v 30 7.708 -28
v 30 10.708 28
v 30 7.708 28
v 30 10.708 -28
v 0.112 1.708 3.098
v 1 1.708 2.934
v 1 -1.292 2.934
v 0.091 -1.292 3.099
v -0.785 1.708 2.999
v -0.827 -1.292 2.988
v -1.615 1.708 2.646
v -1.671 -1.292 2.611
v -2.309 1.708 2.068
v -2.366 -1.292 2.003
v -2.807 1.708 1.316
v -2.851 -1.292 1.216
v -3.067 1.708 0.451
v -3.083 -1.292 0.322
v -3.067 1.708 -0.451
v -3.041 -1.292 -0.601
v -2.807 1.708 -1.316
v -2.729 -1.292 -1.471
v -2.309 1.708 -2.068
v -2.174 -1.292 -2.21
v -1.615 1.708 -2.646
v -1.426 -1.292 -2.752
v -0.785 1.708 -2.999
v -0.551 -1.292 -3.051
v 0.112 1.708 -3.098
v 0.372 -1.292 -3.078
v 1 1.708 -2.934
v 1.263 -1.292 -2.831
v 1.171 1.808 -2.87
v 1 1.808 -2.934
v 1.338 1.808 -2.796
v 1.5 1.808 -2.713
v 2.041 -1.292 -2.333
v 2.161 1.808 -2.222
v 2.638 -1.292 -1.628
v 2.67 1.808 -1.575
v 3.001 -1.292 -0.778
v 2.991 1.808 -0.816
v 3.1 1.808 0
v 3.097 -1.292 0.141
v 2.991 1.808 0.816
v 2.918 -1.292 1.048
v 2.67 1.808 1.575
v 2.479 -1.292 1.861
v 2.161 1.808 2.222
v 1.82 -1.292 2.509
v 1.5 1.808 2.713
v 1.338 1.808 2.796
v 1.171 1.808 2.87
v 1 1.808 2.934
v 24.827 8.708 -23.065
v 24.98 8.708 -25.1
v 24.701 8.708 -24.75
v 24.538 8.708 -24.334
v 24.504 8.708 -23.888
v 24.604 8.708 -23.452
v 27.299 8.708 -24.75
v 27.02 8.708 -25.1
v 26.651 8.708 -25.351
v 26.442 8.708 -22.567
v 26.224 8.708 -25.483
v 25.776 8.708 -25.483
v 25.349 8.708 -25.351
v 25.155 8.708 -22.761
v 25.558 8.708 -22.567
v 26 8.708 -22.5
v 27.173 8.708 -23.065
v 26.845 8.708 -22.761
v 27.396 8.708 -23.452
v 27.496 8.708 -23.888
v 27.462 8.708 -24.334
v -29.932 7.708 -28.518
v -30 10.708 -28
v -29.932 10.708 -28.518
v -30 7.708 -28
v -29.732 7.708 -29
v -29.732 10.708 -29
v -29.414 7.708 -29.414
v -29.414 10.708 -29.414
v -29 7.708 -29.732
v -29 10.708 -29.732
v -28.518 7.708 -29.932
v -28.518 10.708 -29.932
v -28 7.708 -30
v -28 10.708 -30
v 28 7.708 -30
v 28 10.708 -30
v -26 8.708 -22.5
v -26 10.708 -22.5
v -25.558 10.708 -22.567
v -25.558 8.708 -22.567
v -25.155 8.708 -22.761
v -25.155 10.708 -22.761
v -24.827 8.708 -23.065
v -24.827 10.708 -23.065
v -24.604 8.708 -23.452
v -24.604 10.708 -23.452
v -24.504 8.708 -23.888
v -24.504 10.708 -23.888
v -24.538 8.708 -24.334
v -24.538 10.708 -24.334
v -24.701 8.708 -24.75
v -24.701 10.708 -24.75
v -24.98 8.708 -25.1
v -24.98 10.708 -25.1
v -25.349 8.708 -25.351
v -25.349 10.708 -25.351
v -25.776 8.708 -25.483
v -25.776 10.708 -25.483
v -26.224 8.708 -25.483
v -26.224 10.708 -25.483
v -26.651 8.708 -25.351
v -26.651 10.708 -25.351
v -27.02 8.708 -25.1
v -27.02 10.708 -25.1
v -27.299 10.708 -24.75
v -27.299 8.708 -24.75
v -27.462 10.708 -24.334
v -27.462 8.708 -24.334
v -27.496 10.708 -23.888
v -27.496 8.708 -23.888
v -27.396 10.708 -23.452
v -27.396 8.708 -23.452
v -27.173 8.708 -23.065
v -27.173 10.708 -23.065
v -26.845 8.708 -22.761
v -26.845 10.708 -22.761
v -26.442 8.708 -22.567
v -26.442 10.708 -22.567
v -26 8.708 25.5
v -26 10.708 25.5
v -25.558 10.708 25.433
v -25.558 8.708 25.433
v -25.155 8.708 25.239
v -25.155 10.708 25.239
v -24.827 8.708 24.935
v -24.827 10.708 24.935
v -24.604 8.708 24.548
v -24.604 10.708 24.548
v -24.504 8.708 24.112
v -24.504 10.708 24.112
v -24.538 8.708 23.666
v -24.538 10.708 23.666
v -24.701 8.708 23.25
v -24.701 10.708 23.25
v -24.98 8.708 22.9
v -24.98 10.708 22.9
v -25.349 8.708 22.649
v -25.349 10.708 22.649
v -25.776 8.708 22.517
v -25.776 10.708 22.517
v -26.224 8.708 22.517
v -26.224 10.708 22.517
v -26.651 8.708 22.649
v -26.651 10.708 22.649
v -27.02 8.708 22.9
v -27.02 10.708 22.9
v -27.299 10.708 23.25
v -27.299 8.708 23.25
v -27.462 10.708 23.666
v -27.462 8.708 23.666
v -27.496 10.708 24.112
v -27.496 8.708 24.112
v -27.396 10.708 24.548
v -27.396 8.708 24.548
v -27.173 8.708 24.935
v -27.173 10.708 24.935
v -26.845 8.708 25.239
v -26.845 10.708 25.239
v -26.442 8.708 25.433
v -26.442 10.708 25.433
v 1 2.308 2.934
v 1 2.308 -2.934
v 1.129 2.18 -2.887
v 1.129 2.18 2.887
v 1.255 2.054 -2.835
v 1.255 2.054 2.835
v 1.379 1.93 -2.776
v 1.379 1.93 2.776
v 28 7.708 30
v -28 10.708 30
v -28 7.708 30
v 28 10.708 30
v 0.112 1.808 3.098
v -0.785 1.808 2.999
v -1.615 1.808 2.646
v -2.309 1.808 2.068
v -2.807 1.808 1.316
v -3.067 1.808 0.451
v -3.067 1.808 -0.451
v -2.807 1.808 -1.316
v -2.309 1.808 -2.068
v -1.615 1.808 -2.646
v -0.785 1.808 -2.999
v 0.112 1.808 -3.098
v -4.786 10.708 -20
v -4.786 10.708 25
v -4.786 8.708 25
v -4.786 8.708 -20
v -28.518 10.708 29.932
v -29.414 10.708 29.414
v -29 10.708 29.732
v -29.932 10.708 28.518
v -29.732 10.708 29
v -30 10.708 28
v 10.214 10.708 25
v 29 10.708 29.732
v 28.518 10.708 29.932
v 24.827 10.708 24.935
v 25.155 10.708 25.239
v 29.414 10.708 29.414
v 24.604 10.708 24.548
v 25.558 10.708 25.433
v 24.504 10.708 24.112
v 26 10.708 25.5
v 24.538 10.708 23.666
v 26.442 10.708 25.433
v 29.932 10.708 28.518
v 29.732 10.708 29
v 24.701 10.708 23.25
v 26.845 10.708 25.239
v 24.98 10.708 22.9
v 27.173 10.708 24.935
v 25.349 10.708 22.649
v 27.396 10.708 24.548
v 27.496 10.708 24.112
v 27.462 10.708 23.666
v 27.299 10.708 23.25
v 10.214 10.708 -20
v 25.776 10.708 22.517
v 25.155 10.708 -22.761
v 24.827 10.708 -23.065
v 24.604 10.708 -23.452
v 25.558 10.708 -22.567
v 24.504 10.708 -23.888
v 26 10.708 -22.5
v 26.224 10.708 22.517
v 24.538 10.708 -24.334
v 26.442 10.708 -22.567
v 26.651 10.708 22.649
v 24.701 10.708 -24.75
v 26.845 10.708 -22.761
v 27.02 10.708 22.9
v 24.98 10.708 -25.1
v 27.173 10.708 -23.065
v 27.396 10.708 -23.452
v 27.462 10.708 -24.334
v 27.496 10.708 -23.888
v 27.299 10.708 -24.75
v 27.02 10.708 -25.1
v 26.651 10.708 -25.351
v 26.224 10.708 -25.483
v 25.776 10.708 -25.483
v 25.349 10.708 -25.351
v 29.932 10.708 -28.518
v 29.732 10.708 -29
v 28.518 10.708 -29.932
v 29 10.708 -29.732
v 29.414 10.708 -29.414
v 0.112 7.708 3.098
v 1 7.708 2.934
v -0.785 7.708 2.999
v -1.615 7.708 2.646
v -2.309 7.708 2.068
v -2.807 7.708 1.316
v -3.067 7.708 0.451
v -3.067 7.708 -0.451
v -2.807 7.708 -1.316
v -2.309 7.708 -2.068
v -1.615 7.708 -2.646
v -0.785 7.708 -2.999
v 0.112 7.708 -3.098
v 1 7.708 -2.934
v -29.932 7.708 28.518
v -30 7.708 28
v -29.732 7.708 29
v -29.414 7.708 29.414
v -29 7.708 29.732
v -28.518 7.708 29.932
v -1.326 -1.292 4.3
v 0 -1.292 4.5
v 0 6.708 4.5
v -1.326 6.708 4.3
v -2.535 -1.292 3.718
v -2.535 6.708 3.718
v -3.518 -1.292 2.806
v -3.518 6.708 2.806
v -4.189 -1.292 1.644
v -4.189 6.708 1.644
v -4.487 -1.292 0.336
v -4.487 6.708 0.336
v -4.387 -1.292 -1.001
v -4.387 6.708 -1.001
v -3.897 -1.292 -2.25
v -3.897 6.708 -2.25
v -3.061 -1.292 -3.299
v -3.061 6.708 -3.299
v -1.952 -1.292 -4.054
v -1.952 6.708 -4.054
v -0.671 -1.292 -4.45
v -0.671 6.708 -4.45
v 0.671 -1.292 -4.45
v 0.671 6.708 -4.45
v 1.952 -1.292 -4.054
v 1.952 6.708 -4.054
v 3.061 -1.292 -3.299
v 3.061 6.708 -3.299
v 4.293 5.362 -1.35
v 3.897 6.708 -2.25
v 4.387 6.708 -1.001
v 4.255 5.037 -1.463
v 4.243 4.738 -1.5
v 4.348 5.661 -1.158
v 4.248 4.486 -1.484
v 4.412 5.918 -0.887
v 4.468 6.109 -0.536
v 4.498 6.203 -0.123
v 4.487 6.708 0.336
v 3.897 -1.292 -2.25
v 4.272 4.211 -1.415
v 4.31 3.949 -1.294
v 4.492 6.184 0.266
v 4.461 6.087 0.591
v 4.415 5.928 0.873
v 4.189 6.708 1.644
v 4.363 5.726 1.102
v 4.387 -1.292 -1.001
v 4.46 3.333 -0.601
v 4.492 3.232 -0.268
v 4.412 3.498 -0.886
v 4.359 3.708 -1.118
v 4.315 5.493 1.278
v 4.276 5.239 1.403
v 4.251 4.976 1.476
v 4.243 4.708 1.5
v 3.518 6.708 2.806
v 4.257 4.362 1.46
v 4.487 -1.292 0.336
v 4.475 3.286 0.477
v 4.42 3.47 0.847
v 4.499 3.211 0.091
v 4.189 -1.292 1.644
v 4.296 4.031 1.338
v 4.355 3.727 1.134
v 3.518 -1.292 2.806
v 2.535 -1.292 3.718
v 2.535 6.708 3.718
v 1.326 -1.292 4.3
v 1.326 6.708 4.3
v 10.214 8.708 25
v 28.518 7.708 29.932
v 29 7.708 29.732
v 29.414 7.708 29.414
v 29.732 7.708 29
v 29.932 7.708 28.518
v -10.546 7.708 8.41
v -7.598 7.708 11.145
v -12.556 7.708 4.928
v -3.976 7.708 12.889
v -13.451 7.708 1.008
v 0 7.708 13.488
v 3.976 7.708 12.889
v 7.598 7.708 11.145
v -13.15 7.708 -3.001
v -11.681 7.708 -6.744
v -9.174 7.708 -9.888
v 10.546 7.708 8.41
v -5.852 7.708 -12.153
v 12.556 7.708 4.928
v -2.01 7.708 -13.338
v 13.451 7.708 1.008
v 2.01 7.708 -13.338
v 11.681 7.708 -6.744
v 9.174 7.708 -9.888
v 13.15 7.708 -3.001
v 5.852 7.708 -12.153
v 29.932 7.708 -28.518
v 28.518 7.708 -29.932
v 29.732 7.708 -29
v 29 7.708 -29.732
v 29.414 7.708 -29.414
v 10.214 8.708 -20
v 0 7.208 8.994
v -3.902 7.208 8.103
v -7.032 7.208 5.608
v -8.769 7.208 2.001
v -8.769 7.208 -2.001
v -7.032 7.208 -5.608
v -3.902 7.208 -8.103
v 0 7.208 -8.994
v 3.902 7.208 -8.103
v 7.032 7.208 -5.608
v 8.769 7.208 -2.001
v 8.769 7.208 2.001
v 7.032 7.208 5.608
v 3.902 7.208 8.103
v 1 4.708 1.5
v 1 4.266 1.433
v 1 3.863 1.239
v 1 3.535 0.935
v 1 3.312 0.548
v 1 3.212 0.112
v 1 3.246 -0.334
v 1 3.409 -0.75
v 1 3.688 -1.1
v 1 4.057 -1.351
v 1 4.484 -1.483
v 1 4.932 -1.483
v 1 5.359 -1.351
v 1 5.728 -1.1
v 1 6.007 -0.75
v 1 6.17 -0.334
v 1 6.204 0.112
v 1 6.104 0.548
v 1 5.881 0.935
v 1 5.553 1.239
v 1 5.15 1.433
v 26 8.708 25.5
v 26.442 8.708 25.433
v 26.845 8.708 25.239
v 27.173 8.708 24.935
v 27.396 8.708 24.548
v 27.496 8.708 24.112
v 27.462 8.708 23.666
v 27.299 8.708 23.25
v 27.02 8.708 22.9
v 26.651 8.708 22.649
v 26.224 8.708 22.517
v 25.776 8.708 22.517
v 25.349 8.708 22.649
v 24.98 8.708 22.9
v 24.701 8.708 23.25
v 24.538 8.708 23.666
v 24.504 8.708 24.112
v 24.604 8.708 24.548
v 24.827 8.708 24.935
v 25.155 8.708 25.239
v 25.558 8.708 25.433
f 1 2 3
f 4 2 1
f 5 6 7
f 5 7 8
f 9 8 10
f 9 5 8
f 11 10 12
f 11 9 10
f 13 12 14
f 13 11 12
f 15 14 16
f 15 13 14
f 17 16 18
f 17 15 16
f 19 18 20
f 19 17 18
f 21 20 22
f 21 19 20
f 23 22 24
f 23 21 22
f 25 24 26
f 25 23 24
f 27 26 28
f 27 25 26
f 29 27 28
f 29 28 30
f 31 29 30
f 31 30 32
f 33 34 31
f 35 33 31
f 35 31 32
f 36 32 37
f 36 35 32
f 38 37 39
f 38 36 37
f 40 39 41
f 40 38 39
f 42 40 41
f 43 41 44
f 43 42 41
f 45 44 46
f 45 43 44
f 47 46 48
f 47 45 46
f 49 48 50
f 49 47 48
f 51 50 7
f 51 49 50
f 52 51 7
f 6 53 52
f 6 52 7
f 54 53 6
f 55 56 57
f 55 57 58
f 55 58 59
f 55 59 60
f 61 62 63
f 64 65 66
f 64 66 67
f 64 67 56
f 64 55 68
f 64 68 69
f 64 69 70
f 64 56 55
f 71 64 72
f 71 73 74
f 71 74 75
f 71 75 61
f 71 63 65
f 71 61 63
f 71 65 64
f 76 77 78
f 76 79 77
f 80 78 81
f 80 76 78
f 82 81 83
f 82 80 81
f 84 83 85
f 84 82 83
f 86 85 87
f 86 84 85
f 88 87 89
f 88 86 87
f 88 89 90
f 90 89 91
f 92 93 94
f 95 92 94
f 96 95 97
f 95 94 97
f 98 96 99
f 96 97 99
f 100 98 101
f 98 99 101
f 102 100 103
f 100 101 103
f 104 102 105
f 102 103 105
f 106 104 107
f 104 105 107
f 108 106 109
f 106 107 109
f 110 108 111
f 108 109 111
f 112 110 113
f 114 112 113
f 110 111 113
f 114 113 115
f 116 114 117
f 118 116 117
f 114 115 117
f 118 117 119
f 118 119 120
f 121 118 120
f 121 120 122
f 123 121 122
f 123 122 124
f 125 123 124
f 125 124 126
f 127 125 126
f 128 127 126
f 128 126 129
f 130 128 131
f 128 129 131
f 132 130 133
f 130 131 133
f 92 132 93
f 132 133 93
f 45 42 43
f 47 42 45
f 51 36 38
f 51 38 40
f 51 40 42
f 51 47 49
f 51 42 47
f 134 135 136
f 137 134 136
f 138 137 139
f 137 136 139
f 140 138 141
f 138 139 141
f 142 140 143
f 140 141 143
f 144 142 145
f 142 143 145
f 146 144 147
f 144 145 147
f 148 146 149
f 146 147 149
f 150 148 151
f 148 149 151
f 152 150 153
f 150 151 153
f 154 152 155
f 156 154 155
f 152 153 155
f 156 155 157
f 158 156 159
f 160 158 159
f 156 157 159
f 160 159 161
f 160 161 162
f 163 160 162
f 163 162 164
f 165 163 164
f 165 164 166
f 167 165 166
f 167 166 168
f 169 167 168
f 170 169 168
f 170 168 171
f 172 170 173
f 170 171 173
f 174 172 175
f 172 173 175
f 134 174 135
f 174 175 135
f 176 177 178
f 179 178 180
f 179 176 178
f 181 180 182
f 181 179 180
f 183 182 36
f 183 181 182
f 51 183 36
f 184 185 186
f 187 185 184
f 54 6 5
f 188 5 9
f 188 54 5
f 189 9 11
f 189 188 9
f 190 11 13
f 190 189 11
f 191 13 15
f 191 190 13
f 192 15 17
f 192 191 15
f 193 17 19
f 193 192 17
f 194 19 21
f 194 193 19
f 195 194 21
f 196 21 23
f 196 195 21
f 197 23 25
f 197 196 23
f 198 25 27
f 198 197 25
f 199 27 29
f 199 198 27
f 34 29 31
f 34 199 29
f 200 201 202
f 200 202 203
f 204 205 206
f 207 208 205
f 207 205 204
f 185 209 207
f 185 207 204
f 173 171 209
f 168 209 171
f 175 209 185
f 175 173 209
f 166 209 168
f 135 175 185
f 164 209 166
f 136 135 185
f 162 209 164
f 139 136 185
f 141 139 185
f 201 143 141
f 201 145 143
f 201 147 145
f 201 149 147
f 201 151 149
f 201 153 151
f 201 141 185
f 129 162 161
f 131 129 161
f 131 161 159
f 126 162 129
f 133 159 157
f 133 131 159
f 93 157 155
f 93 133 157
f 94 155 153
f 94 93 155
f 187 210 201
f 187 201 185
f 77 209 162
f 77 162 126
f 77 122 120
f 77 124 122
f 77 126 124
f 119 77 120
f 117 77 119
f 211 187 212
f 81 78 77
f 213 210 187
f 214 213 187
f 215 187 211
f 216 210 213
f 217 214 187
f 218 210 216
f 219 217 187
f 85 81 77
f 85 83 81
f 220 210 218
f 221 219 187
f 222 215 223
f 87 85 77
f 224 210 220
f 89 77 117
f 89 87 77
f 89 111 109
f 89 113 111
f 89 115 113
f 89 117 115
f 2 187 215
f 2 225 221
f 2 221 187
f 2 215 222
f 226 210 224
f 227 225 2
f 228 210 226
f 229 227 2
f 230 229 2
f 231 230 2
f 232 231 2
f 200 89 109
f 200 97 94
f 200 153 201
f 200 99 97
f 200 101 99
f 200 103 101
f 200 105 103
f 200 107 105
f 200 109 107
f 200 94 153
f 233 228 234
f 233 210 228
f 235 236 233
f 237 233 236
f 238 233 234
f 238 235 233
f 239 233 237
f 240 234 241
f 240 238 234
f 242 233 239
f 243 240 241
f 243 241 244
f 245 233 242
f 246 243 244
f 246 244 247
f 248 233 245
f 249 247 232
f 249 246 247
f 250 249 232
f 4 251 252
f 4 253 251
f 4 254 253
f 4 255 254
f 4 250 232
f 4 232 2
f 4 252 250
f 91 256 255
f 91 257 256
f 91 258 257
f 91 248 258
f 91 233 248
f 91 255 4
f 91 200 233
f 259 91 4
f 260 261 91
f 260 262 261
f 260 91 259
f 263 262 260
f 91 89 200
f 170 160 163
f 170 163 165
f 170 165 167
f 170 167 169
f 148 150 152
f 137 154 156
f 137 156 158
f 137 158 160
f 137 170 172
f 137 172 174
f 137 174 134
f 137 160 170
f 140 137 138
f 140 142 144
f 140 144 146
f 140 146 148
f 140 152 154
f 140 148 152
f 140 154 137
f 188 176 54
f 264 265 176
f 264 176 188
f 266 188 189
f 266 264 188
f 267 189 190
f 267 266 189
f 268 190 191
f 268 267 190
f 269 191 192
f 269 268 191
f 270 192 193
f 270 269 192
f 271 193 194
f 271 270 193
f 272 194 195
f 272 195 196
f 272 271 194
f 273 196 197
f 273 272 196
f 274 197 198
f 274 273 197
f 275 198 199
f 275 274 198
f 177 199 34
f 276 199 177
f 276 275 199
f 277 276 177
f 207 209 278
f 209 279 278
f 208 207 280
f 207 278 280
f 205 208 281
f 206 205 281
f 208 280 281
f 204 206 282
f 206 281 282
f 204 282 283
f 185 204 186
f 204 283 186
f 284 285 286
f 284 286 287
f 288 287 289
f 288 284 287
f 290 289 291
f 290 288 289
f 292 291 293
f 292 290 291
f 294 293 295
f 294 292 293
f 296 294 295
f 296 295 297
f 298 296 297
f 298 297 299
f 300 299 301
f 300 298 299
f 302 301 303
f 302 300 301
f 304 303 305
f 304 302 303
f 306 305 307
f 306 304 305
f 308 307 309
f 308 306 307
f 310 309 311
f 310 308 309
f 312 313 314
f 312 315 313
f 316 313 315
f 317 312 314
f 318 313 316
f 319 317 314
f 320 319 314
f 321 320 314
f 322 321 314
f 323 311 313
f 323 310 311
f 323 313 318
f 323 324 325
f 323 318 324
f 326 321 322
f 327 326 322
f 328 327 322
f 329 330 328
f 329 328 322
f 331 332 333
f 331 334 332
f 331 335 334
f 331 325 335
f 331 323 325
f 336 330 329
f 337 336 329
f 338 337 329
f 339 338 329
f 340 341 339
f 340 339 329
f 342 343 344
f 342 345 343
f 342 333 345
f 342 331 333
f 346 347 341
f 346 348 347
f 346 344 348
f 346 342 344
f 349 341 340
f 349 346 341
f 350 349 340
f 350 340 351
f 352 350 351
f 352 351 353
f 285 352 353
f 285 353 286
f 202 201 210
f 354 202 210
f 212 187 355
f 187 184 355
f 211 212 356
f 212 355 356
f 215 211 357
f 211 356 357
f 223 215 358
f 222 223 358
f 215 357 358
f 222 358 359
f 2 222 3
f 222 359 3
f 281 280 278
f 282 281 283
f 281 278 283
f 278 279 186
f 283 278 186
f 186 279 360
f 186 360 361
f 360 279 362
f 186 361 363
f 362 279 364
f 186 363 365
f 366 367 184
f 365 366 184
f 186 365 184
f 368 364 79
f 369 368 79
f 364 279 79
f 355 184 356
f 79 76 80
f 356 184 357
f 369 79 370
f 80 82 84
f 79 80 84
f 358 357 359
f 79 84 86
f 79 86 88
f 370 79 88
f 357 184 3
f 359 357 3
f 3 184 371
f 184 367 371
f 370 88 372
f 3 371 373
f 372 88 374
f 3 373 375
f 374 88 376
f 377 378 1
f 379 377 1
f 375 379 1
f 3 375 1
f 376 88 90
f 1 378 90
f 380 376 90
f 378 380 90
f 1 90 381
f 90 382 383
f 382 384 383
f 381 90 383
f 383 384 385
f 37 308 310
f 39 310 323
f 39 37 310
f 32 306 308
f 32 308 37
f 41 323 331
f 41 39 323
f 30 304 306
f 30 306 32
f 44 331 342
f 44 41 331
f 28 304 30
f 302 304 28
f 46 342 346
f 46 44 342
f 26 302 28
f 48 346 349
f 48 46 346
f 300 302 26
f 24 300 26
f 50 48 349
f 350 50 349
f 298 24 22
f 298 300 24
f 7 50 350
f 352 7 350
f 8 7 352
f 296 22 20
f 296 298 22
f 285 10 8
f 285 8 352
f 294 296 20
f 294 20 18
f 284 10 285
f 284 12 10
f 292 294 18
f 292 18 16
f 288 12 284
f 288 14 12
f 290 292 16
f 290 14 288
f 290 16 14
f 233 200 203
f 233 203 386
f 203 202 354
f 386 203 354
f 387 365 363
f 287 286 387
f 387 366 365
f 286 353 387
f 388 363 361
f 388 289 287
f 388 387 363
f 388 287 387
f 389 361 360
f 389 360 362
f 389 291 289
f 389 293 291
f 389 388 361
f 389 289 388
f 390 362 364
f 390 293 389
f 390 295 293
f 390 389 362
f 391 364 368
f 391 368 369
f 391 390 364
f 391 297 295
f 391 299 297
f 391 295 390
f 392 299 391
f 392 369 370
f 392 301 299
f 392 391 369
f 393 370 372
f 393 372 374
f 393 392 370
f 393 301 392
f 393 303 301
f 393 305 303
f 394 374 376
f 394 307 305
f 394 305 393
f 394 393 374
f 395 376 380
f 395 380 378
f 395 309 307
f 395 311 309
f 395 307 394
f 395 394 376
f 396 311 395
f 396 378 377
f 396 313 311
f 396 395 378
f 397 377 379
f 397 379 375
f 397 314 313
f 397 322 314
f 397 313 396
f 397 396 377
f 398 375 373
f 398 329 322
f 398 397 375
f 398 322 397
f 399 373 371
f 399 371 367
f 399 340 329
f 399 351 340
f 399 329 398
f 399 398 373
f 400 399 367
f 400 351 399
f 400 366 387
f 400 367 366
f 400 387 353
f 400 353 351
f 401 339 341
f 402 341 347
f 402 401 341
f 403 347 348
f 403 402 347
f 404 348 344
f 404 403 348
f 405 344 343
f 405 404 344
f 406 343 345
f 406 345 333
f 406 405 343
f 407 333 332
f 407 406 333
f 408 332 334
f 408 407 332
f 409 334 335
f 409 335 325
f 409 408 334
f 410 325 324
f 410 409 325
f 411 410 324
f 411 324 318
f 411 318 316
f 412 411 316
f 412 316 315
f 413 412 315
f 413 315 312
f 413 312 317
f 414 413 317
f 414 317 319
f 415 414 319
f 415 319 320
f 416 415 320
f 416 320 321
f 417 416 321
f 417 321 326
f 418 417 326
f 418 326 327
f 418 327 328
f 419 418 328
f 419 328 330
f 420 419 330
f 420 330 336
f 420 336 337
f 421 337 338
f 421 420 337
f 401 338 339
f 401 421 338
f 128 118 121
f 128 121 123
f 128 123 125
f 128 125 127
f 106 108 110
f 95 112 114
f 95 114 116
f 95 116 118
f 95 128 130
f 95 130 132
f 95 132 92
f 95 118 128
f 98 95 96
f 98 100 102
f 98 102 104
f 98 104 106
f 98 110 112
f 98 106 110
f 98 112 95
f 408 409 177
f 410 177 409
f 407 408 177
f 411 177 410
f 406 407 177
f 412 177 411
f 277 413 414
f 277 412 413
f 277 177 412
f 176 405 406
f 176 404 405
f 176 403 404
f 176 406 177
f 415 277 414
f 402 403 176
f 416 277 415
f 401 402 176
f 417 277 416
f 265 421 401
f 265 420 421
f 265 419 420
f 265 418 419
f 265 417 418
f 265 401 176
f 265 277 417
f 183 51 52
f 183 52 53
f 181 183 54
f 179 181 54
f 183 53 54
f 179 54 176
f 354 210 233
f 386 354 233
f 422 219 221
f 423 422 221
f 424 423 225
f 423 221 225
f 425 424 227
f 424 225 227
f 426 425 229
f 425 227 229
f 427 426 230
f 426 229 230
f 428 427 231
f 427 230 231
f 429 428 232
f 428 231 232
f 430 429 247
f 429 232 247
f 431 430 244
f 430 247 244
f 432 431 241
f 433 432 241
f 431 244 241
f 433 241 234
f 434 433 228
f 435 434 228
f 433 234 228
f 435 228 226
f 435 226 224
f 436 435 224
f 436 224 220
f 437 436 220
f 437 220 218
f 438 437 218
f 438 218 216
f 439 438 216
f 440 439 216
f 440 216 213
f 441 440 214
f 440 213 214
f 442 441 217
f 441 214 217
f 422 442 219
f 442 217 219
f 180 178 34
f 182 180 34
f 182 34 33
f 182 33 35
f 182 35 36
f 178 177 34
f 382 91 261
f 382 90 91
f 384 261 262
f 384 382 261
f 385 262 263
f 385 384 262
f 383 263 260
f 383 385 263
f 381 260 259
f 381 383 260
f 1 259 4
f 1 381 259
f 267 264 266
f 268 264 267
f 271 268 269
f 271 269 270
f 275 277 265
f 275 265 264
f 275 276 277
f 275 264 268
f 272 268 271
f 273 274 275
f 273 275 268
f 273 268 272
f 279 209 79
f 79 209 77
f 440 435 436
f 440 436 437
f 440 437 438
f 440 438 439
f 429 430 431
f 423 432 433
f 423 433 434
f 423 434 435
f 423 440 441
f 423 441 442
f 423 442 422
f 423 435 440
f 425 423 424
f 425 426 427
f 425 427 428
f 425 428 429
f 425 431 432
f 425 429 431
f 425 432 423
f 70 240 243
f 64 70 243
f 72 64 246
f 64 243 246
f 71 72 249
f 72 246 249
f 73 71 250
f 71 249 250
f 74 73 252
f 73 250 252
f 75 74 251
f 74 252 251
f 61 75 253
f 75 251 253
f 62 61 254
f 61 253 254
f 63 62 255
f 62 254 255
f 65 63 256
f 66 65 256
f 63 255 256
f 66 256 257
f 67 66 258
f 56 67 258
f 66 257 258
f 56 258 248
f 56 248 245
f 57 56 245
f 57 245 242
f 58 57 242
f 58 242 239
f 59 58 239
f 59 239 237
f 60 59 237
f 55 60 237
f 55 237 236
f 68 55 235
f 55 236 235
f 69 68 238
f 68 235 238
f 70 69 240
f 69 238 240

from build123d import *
from build123d.topology import SkipClean

# Parameters (mm, degrees)
CORTAR_EXTRUIR7_REACH      = 34.904
CORTAR_EXTRUIR7_END_RADIUS = 4.5
CROQUIS17_R                = 1.5
CORTAR_EXTRUIR10_START     = -3
CORTAR_EXTRUIR10_DEPTH     = 6
CROQUIS21_W                = 3.1
CROQUIS21_H                = 3.480038904
CHAFL_N2_SIZE              = 0.5
CROQUIS22_W                = 60
CROQUIS22_H                = 60
SALIENTE_EXTRUIR1_DEPTH    = 3
REDONDEO1_R                = 2
CROQUIS23_R                = 1.5
CROQUIS23_W                = 15
CROQUIS23_H                = 45
CORTAR_EXTRUIR11_DEPTH     = 2


with BuildPart() as part:
    # Croquis9 → Revolución3 (revolve)
    with BuildSketch(Plane.XY, mode=Mode.PRIVATE) as revoluci_n3_sk:
        Polygon((0, 10.708007251), (-22, 10.708007251), (-22, 7.708007251), (-13.488403702, 7.708007251), (-4.5, 6.708007251), (-4.5, -1.291992749), (0, -1.291992749), align=None)
    revolve(revoluci_n3_sk.sketch.rotate(Axis((0, 17.712309747, 0), (0, -1, 0)), 270), axis=Axis((0, 17.712309747, 0), (0, -1, 0)))

    # Cortar-Extruir7: up to this cylinder (the profile starts inside it)
    cortar_extruir7_end = Plane(origin=(0, 4.708007, 0), z_dir=(0, 1, 0)) * Cylinder(CORTAR_EXTRUIR7_END_RADIUS, 79.808, mode=Mode.PRIVATE)
    # Croquis17 → Cortar-Extruir7 (cut, up to the surface)
    with BuildSketch(Plane(origin=(0, 0, 0), x_dir=(0, 0, -1), z_dir=(1, 0, 0)), mode=Mode.PRIVATE) as cortar_extruir7_sk1:
        with Locations(Location((0, 4.708007251, 0), (0, 0, 180))):
            Circle(CROQUIS17_R)
    cortar_extruir7_tool1 = extrude(cortar_extruir7_sk1.sketch, amount=CORTAR_EXTRUIR7_REACH, mode=Mode.PRIVATE) & cortar_extruir7_end
    add(cortar_extruir7_tool1.solids().sort_by_distance((0, 4.708007, 0))[0], mode=Mode.SUBTRACT)

    # Croquis18 → Cortar-Extruir10 (cut)
    with BuildSketch(Plane(origin=(0, 10.708007251, 0), x_dir=(1, 0, 0), z_dir=(0, 1, 0)).offset(CORTAR_EXTRUIR10_START)):
        with BuildLine():
            Line((1, 2.93428015), (1, -2.93428015))
            ThreePointArc((1, -2.93428015), (-3.1, 0), (1, 2.93428015))
        make_face()
    extrude(amount=-CORTAR_EXTRUIR10_DEPTH, mode=Mode.SUBTRACT)

    # Croquis21 → Cortar-Revolución1 (revolve, cut)
    with SkipClean():  # the faces are left unmerged after this step: merging them gives an invalid solid
        with BuildSketch(Plane.XY, mode=Mode.PRIVATE) as cortar_revoluci_n1_sk:
            with Locations((-1.55, 0.068456853)):
                Rectangle(CROQUIS21_W, CROQUIS21_H)
        revolve(cortar_revoluci_n1_sk.sketch.rotate(Axis((0, 3.581140077, 0), (0, -1, 0)), 251.180936631), axis=Axis((0, 3.581140077, 0), (0, -1, 0)), mode=Mode.SUBTRACT)

    # Chaflán2
    # the kernel refuses this chamfer: 0.5 mm, written as the material it takes off along each edge
    with BuildSketch(Plane(origin=(1, 1.808476305, 4.220121644), x_dir=(-0.02749587661058627, 0.9996219169112968, 0), z_dir=(0, 0, -1))) as chafl_n2_piece_1_section:
        Polygon((CHAFL_N2_SIZE * 0.999621916911, CHAFL_N2_SIZE * 0.0274958766106), (-CHAFL_N2_SIZE * 0.0274958766106, CHAFL_N2_SIZE * 0.999621916911), (0, 0), align=None)
    chafl_n2_piece_1 = extrude(amount=8.440243288, mode=Mode.PRIVATE)
    chafl_n2_piece_1 = chafl_n2_piece_1 & Plane(origin=(0, 1.974615601, 0), x_dir=(0.32258064516148965, 0, 0.946541983943236), z_dir=(0, -1, 0)) * Cylinder(3.1, 19, mode=Mode.PRIVATE)
    add(chafl_n2_piece_1, mode=Mode.SUBTRACT)

    # Croquis22 → Saliente-Extruir1 (add)
    with BuildSketch(Plane(origin=(0, 10.708007251, 0), x_dir=(1, 0, 0), z_dir=(0, 1, 0))):
        Rectangle(CROQUIS22_W, CROQUIS22_H)
    extrude(amount=-SALIENTE_EXTRUIR1_DEPTH)

    # Redondeo1
    redondeo1_edges = [part.edges().sort_by_distance(p)[0] for p in [
        (-30, 9.208007251, -30),
        (-30, 9.208007251, 30),
        (30, 9.208007251, 30),
        (30, 9.208007251, -30),
    ]]
    fillet(redondeo1_edges, radius=REDONDEO1_R)

    # Croquis23 → Cortar-Extruir11 (cut)
    with BuildSketch(Plane(origin=(0, 10.708007251, 0), x_dir=(1, 0, 0), z_dir=(0, 1, 0))):
        with Locations(Location((-26, 24, 0), (0, 0, 270))):
            Circle(CROQUIS23_R)
        with Locations(Location((-26, -24, 0), (0, 0, 270))):
            Circle(CROQUIS23_R)
        with Locations(Location((26, -24, 0), (0, 0, 270))):
            Circle(CROQUIS23_R)
        with Locations(Location((26, 24, 0), (0, 0, 270))):
            Circle(CROQUIS23_R)
        with Locations((2.713645645, -2.5)):
            Rectangle(CROQUIS23_W, CROQUIS23_H)
    extrude(amount=-CORTAR_EXTRUIR11_DEPTH, mode=Mode.SUBTRACT)


solid = part.part
